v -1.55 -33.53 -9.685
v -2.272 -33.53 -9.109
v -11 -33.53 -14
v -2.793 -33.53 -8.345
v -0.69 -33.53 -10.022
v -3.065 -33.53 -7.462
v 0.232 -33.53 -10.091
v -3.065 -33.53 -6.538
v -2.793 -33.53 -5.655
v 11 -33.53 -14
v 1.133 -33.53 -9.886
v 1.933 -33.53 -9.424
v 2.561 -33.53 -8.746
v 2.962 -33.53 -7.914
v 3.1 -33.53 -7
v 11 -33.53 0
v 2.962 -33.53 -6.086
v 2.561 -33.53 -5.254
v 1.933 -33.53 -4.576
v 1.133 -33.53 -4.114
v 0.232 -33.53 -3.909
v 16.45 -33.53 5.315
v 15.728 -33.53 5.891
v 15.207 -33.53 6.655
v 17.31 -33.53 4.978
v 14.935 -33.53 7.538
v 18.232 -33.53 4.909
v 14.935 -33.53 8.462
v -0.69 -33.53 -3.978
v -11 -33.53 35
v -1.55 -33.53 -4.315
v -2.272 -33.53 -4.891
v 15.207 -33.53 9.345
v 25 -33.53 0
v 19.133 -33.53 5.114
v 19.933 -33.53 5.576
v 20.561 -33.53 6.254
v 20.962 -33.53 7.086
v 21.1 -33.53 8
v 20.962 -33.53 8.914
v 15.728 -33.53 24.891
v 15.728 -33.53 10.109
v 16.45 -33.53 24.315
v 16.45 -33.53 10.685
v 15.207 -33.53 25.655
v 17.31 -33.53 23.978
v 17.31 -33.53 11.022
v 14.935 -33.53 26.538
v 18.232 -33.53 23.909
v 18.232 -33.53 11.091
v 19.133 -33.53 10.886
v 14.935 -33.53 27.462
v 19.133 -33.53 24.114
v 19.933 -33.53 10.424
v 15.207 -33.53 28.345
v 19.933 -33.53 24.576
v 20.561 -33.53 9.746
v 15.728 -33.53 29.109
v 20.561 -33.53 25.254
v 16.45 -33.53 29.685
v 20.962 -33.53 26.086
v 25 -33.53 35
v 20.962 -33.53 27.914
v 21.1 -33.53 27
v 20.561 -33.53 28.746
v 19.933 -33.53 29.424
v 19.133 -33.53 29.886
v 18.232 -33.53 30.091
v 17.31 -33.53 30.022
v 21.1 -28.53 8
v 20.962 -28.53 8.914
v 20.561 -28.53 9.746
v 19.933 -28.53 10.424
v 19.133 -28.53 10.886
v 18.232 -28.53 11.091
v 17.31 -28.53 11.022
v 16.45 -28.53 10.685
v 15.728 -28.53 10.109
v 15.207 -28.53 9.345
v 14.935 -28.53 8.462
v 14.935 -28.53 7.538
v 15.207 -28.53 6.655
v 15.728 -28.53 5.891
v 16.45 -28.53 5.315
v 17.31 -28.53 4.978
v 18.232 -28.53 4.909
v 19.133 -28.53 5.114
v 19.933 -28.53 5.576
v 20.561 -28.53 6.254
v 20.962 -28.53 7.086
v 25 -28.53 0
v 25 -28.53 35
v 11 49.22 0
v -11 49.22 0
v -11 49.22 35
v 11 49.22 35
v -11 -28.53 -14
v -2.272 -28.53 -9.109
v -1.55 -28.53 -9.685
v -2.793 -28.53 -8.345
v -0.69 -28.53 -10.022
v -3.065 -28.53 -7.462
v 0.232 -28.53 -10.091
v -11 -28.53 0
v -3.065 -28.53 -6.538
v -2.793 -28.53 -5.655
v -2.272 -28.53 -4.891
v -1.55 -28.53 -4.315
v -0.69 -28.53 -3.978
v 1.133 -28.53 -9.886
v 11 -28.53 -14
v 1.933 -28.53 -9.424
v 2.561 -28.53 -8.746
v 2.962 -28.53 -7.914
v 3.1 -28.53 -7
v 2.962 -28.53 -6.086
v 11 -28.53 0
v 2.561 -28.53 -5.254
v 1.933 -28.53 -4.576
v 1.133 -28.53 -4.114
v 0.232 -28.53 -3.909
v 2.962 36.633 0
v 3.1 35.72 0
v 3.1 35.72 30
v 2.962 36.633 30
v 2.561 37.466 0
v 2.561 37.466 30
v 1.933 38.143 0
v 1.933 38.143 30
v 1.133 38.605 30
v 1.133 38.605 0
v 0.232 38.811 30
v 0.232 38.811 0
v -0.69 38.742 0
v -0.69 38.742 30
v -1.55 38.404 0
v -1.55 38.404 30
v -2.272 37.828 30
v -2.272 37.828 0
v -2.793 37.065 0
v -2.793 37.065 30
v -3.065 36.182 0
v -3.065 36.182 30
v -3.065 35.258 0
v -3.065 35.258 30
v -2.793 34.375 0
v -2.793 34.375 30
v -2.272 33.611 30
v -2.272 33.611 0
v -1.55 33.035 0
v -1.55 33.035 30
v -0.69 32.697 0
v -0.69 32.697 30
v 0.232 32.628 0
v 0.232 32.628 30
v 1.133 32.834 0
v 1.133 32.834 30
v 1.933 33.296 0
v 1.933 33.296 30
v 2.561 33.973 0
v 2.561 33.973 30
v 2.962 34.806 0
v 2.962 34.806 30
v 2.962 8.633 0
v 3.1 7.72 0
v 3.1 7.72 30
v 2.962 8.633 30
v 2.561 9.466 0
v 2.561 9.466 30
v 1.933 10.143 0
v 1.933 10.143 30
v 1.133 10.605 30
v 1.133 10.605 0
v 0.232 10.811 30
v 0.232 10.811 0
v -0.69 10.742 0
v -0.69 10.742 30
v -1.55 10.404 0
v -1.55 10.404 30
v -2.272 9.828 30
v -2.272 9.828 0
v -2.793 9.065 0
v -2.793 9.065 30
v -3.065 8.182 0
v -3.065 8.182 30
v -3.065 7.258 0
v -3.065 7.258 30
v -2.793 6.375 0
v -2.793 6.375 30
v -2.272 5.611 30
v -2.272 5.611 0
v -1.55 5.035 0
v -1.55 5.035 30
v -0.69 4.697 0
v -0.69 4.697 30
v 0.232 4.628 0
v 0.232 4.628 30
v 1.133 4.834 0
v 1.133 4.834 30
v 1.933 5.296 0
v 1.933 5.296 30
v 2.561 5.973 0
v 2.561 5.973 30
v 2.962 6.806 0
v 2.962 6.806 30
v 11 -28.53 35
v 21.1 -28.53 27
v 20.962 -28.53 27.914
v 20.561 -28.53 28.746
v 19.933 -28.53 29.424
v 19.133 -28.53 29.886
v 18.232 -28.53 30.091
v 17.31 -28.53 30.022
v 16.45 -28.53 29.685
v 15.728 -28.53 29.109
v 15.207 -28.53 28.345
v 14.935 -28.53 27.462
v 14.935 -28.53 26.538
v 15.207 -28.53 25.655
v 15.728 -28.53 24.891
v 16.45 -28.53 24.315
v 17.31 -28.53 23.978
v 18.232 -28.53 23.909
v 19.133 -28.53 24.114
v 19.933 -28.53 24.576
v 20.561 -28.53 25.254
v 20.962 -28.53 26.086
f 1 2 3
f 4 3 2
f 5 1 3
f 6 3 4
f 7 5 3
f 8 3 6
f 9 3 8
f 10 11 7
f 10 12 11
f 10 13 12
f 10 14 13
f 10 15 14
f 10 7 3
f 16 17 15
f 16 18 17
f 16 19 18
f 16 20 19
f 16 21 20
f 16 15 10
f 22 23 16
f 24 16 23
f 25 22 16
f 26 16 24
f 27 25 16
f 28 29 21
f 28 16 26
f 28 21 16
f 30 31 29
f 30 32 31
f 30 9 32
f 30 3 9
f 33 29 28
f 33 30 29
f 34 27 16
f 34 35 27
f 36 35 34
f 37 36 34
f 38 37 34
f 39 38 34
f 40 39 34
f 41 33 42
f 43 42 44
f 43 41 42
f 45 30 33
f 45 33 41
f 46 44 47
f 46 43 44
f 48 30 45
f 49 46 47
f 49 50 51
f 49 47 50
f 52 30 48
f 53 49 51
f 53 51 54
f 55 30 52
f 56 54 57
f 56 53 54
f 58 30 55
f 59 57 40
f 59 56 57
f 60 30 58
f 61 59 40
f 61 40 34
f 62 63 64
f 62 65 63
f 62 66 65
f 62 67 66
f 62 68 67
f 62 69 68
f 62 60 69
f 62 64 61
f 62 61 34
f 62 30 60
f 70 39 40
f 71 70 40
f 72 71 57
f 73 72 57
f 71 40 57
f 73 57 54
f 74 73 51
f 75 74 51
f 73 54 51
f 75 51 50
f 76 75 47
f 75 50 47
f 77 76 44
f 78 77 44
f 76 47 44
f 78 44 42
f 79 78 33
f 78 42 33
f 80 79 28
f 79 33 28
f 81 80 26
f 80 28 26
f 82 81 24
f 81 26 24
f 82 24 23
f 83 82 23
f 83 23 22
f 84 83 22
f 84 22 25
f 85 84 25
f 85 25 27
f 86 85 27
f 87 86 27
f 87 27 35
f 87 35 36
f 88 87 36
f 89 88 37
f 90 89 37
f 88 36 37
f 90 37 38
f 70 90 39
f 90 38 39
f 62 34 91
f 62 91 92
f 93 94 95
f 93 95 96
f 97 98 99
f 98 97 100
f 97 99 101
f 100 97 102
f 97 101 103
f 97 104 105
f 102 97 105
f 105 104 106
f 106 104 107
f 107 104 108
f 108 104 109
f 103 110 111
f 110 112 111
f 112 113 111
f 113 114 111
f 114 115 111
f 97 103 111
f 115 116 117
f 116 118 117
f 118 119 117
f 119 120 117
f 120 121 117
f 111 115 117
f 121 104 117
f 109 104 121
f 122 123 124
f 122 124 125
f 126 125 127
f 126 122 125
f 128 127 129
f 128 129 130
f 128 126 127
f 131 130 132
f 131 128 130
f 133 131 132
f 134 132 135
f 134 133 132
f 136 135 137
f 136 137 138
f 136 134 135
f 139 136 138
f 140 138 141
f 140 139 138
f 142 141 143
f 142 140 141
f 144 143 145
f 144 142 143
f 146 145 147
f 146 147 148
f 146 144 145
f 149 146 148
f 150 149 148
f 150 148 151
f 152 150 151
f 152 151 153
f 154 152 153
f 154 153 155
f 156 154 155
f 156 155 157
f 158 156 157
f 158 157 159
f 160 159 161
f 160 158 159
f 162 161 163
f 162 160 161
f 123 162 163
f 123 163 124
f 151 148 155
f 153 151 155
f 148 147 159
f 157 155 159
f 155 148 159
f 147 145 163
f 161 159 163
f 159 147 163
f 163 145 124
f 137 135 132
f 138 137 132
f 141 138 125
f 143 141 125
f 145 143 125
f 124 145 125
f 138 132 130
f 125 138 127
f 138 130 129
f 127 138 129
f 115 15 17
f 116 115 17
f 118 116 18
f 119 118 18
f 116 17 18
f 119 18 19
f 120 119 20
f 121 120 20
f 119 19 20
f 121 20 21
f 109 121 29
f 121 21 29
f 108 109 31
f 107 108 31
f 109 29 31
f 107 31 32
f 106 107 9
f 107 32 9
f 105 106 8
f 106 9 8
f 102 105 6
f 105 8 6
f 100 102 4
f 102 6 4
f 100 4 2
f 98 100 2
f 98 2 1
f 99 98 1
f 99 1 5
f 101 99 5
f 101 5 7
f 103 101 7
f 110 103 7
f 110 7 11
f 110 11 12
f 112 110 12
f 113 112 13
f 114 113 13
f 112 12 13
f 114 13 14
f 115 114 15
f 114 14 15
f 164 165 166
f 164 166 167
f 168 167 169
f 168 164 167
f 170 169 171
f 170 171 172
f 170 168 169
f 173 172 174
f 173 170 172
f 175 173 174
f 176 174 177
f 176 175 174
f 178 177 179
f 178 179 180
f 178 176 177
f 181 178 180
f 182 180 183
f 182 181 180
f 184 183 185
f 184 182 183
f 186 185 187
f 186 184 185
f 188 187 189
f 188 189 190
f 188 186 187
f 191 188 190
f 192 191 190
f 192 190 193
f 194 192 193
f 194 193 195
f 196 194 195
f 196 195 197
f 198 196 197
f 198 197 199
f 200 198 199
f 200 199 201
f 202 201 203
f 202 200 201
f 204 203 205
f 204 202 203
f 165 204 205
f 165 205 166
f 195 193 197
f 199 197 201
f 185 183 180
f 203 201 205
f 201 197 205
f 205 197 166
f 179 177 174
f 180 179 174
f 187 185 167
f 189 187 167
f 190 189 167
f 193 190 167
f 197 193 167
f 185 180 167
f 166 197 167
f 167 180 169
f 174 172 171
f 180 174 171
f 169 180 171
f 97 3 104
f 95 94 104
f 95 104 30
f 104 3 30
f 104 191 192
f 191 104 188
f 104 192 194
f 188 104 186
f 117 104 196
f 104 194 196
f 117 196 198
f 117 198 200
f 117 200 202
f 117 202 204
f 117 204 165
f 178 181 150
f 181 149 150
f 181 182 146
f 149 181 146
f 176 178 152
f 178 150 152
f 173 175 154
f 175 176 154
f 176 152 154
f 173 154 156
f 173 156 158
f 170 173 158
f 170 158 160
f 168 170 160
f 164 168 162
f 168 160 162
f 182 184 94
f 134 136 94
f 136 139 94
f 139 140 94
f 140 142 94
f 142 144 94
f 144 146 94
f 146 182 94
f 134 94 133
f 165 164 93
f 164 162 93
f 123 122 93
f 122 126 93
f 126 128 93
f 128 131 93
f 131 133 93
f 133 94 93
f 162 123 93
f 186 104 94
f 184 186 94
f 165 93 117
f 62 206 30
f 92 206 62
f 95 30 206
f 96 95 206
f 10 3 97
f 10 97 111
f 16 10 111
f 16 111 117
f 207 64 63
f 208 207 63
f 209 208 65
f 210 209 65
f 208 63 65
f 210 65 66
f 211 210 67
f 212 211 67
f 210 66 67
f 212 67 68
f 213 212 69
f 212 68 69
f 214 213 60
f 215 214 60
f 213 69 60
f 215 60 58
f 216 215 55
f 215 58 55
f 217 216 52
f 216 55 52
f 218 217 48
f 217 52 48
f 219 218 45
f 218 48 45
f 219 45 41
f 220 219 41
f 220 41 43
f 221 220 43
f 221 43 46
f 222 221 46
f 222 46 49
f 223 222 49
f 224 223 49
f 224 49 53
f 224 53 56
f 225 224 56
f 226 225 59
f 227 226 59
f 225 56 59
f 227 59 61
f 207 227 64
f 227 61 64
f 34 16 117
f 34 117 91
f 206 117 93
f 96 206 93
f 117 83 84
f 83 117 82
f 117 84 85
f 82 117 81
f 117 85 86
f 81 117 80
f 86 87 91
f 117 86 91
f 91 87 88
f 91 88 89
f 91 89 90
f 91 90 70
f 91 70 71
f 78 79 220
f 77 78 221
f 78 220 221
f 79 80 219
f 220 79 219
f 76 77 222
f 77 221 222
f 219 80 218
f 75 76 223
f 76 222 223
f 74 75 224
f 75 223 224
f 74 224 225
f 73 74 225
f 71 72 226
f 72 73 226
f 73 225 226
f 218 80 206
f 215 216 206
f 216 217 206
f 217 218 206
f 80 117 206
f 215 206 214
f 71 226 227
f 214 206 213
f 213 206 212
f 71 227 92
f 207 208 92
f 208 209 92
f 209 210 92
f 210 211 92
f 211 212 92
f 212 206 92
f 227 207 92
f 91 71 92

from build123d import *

# Parameters (mm, degrees)
SKETCH1_W           = 22
SKETCH1_H           = 82.75
SKETCH1_R           = 3.1
BOSS_EXTRUDE1_DEPTH = 30
SKETCH2_W           = 22
SKETCH2_H           = 82.75
BOSS_EXTRUDE2_DEPTH = 5
SKETCH3_W           = 22
SKETCH3_H           = 14
SKETCH3_R           = 3.1
SKETCH3_W_2         = 14
SKETCH3_H_2         = 35
BOSS_EXTRUDE3_DEPTH = 5


with BuildPart() as part:
    # Sketch1 → Boss-Extrude1 (new body)
    with BuildSketch(Plane.XY):
        with Locations((0, 7.844654309)):
            Rectangle(SKETCH1_W, SKETCH1_H)
        with Locations((0, 35.719654309)):
            Circle(SKETCH1_R, mode=Mode.SUBTRACT)
        with Locations((0, 7.719654309)):
            Circle(SKETCH1_R, mode=Mode.SUBTRACT)
    extrude(amount=BOSS_EXTRUDE1_DEPTH)

    # Sketch2 → Boss-Extrude2 (add)
    with BuildSketch(Plane.XY.offset(30)):
        with Locations((0, 7.844654309)):
            Rectangle(SKETCH2_W, SKETCH2_H)
    extrude(amount=BOSS_EXTRUDE2_DEPTH)

    # Sketch3 → Boss-Extrude3 (add)
    with BuildSketch(Plane.XZ.offset(33.530345691)):
        with Locations((0, -7)):
            Rectangle(SKETCH3_W, SKETCH3_H)
        with Locations((0, -7)):
            Circle(SKETCH3_R, mode=Mode.SUBTRACT)
        with Locations((18, 17.5)):
            Rectangle(SKETCH3_W_2, SKETCH3_H_2)
        with Locations((18, 27)):
            Circle(SKETCH3_R, mode=Mode.SUBTRACT)
        with Locations((18, 8)):
            Circle(SKETCH3_R, mode=Mode.SUBTRACT)
    extrude(amount=-BOSS_EXTRUDE3_DEPTH)


solid = part.part
